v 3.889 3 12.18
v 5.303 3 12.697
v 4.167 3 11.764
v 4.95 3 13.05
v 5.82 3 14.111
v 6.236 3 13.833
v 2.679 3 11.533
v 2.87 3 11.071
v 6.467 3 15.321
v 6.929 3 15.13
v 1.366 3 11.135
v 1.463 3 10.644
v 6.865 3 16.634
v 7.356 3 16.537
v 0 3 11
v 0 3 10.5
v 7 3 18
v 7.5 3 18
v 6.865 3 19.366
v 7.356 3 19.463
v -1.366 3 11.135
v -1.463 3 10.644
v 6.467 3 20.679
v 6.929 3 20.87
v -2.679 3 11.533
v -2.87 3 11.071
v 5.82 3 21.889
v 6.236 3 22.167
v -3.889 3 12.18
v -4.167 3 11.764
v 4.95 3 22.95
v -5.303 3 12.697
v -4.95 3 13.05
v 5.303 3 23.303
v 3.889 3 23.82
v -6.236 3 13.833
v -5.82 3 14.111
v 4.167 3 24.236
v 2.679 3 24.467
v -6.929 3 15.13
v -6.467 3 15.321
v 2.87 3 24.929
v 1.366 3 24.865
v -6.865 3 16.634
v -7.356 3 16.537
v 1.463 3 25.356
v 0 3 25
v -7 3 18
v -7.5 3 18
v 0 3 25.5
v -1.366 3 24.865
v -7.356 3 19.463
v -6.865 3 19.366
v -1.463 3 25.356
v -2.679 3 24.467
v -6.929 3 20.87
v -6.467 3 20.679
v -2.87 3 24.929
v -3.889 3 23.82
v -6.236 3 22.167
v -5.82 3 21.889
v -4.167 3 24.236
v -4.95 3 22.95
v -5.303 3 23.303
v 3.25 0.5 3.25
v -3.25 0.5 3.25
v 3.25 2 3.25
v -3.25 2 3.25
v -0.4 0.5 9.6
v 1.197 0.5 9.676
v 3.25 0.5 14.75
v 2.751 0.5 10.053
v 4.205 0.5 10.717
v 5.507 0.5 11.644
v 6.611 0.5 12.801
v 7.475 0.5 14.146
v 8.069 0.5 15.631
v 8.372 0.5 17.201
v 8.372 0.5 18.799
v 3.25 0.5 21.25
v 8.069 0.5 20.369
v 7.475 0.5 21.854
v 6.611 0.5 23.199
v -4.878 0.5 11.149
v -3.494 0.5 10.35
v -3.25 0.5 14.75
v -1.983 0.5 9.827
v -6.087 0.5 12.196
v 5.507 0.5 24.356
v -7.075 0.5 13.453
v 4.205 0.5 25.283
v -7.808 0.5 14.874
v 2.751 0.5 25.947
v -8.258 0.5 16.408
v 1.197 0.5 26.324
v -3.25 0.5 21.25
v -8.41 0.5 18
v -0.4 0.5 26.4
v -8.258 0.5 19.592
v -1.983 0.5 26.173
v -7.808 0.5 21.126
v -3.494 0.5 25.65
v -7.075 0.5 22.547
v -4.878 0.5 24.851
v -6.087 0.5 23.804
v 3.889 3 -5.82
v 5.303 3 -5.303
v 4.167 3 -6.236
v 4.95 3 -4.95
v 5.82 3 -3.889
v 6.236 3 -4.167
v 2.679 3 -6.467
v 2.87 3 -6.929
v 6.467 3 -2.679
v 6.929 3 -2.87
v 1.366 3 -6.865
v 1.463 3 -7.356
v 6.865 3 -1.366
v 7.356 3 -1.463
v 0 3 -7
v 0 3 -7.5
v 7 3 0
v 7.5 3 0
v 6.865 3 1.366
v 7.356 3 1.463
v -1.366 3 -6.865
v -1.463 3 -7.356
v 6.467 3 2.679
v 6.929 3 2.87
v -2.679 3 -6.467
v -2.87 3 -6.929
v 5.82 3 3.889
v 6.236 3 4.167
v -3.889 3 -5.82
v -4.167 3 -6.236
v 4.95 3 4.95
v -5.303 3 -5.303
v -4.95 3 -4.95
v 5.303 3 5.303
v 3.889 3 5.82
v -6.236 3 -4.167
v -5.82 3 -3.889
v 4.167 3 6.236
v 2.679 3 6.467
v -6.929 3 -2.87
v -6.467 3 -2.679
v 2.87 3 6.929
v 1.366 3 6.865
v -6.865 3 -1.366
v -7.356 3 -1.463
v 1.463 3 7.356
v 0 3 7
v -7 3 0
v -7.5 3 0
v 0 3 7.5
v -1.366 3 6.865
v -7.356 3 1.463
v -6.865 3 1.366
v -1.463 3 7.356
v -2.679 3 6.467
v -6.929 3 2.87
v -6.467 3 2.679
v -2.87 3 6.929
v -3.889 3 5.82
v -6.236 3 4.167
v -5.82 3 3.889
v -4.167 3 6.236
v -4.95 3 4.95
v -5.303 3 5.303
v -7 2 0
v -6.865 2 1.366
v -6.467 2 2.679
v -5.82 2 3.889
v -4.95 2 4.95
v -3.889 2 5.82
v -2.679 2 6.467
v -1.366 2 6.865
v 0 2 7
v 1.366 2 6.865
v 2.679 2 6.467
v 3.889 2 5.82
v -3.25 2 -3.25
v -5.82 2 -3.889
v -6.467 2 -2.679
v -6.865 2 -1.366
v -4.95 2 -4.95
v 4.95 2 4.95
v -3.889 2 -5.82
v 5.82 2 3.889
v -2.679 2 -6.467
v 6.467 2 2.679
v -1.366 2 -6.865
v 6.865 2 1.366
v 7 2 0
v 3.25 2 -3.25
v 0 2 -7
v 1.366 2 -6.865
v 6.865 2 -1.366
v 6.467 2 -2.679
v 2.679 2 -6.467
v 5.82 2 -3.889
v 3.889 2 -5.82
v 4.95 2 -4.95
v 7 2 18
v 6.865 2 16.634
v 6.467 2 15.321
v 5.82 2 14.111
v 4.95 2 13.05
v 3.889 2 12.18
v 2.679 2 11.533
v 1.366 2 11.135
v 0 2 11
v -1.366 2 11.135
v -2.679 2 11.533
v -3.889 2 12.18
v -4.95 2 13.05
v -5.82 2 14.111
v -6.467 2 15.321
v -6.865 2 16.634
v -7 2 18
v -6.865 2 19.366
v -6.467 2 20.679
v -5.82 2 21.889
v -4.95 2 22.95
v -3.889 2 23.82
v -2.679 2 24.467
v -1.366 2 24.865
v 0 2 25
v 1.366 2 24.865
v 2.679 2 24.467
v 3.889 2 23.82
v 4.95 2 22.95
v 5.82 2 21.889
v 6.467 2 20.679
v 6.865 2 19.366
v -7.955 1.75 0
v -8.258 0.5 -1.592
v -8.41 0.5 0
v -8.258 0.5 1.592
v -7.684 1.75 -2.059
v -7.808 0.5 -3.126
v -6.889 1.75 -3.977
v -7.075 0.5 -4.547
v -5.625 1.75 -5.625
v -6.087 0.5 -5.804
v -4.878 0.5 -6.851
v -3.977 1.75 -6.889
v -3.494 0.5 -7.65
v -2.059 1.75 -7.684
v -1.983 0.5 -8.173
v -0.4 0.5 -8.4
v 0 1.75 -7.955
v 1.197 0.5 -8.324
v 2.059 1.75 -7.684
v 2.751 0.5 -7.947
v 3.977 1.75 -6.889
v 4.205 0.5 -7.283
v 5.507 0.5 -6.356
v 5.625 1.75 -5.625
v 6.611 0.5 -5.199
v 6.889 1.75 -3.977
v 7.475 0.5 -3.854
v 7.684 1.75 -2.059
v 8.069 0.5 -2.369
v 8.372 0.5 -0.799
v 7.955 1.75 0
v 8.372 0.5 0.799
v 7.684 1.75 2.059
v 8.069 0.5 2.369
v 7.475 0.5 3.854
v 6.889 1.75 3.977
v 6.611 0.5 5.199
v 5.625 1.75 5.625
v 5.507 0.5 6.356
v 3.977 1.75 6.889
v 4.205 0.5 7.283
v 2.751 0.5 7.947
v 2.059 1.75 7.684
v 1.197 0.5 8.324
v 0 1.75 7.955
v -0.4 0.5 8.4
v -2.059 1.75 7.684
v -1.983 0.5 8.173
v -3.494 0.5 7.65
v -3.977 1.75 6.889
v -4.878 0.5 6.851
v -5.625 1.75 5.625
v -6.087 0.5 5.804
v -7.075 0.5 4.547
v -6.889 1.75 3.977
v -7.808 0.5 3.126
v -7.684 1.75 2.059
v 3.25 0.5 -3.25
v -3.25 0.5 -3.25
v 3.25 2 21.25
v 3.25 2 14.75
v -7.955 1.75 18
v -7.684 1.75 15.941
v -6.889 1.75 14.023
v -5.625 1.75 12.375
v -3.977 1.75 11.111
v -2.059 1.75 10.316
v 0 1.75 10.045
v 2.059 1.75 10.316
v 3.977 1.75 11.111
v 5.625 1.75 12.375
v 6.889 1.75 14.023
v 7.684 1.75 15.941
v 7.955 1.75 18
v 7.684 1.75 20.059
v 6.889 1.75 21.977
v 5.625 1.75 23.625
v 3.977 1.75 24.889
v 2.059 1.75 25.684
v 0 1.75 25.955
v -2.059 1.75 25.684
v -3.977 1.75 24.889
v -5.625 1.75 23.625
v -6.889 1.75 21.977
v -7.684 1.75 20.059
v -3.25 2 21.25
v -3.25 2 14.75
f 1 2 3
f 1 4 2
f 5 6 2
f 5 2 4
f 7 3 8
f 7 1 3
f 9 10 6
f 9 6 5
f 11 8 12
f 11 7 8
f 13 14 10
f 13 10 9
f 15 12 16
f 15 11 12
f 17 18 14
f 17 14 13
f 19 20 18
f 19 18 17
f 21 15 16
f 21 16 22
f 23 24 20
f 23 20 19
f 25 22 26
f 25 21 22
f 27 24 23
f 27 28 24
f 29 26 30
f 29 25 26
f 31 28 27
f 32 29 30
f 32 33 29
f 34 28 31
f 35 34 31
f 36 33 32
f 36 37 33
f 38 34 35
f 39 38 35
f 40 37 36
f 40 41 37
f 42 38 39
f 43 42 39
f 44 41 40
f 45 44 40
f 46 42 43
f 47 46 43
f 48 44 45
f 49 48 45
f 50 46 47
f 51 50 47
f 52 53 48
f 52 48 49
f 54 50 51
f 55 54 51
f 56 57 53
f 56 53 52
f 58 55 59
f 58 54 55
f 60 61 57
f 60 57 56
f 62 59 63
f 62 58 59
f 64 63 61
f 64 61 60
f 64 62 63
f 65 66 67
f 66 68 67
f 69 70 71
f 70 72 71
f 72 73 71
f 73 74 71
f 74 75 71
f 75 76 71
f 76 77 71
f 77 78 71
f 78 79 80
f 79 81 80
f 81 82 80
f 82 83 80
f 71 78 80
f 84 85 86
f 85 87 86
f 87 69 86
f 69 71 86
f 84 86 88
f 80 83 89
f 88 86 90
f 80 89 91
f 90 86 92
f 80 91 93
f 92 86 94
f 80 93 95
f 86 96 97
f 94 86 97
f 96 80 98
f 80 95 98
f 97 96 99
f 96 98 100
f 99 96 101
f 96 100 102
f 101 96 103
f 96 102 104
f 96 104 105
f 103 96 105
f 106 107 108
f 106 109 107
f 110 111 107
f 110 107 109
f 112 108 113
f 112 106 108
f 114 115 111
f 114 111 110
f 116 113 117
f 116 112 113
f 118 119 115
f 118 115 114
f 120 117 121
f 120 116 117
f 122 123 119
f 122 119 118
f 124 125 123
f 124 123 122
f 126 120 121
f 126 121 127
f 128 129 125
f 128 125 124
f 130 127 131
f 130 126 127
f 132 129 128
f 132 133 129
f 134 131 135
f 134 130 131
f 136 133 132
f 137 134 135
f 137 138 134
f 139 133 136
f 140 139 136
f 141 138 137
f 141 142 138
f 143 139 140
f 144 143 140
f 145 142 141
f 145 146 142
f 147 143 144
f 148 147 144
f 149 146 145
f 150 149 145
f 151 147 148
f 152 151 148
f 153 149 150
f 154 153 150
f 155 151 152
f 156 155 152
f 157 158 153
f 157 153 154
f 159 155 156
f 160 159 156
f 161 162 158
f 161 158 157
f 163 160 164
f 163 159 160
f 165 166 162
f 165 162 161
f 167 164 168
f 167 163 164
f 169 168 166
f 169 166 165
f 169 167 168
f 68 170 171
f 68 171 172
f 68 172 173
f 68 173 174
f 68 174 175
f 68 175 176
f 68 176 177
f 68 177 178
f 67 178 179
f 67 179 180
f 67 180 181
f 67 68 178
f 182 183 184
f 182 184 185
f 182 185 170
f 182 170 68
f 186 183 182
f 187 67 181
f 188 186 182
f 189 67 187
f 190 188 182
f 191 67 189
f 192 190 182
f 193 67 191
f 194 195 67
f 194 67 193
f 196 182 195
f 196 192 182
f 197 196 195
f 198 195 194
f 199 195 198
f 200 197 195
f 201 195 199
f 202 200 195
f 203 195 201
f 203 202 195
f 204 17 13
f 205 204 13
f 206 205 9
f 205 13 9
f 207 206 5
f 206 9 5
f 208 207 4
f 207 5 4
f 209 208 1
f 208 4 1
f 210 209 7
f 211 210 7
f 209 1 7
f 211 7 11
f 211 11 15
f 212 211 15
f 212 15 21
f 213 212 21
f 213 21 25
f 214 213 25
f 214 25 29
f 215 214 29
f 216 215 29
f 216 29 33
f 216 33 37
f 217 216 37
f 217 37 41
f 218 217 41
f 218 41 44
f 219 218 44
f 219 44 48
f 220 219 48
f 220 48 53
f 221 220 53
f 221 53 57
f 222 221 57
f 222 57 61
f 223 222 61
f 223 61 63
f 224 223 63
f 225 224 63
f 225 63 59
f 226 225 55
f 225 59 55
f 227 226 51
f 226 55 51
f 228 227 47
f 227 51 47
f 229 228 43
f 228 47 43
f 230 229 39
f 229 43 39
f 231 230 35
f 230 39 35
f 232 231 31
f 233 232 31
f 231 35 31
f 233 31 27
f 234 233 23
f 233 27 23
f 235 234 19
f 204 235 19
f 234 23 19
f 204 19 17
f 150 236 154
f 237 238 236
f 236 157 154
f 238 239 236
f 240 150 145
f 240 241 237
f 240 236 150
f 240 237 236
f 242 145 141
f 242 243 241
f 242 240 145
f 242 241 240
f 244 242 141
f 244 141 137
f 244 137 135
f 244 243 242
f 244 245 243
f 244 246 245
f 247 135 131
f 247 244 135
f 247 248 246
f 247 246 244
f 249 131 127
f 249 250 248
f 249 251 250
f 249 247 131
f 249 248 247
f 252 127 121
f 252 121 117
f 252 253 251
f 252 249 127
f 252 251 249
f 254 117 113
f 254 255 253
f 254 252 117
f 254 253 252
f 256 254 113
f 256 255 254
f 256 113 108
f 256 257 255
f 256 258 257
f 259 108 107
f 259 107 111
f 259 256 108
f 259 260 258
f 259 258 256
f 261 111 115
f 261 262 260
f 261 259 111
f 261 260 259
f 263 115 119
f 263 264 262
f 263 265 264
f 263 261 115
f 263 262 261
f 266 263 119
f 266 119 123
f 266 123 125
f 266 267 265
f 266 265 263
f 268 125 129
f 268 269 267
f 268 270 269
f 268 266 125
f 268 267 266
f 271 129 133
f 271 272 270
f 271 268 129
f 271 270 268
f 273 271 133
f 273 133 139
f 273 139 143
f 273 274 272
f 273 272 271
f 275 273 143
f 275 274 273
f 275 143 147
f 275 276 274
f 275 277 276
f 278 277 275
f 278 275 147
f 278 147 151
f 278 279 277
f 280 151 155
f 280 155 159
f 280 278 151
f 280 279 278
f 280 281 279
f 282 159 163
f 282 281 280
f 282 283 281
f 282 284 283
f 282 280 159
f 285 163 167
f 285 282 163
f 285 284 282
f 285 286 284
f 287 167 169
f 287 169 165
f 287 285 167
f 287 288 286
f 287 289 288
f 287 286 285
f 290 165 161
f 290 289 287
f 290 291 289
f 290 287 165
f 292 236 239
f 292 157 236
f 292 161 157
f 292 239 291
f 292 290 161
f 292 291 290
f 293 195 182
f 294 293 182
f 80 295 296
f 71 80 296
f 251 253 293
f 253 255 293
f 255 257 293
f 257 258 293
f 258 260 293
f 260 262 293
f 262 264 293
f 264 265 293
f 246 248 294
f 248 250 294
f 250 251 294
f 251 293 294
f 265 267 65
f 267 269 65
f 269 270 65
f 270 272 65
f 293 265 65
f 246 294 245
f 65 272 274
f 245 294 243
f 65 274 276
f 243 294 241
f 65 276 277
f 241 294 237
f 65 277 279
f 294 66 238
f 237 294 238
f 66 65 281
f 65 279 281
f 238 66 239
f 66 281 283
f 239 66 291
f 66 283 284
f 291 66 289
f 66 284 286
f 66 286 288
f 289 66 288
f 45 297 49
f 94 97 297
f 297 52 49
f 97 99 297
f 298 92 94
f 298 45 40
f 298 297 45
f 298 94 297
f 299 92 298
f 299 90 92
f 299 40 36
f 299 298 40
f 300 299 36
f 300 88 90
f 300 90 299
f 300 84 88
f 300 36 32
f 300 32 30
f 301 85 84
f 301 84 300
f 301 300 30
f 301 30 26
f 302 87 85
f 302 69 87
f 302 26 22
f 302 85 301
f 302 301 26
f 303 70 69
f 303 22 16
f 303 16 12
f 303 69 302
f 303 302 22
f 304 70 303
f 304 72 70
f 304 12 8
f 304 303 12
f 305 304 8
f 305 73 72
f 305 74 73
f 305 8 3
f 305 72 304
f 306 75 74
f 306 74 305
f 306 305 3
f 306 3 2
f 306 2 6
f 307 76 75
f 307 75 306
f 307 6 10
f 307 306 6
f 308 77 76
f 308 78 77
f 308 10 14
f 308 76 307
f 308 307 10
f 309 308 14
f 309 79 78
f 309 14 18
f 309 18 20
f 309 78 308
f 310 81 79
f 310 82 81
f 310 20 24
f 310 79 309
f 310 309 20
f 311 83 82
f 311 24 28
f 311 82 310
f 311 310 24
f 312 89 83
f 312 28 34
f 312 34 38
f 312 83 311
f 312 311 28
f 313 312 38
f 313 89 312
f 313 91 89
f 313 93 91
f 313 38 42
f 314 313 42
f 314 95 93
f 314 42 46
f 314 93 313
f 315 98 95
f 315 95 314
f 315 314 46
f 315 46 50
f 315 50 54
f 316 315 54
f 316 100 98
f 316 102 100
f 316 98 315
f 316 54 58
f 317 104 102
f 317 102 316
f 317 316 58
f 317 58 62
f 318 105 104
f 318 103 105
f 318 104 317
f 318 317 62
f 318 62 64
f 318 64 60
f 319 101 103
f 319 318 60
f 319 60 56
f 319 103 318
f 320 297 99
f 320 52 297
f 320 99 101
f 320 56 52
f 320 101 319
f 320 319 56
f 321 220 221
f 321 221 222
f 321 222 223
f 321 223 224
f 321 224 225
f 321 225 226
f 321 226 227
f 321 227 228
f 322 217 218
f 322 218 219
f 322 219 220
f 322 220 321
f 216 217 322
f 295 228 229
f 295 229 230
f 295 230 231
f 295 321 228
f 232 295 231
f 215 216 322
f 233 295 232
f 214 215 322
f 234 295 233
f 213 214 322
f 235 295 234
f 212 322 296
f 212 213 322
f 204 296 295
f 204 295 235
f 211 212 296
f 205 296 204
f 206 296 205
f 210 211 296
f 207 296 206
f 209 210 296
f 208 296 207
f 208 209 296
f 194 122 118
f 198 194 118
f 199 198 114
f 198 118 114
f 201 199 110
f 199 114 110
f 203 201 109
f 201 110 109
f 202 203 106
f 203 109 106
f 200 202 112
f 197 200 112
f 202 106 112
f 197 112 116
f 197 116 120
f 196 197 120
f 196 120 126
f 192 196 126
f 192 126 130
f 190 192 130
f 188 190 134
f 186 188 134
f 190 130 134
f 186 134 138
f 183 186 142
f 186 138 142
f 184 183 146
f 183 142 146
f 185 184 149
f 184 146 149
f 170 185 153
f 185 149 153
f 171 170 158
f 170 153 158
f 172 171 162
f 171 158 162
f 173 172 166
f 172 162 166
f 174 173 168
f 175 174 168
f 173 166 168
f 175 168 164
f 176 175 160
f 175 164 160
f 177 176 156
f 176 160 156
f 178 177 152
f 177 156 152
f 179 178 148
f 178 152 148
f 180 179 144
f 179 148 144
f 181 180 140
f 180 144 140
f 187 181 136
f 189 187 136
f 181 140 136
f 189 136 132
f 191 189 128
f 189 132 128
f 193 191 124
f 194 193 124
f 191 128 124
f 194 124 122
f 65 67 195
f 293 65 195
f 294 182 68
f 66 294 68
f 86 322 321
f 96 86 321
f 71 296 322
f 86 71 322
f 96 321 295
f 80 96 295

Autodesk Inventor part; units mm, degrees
ref_plane "YZ Plane" through (0, 0, 0) normal (1, 0, 0) x (0, 1, 0)
ref_plane "XZ Plane" through (0, 0, 0) normal (0, 1, 0) x (-1, 0, 0)
ref_plane "XY Plane" through (0, 0, 0) normal (0, 0, 1) x (1, 0, 0)
sketch "Sketch1" plane through (0, 0, 0) normal (0, 1, 0) x (-1, 0, 0)
  circle A0 centre (0, 0) radius 7
  circle A1 centre (0, 0) radius 7.5
  dimension "d0" = 14
  dimension "d1" = 15
extrude "Extrusion1" add sketch "Sketch1" along normal blind 3 contours A0 | A1
sketch "Sketch2" plane through (0, 3, 0) normal (0, 1, 0) x (1, 0, 0)
  line L0 (3.25, 3.25) -> (-3.25, 3.25)
  line L1 (-3.25, 3.25) -> (-3.25, -3.25)
  line L2 (-3.25, -3.25) -> (3.25, -3.25)
  line L3 (3.25, -3.25) -> (3.25, 3.25)
  line L4 (3.25, 3.25) -> (-3.25, -3.25) construction
  line L5 (-3.25, 3.25) -> (3.25, -3.25) construction
  point P0 (0, 0)
  dimension "d4" = 6.5
  dimension "d5" = 6.5
extrude "Extrusion2" cut sketch "Sketch2" against normal through all
sketch "Sketch3" plane through (0, 3, 0) normal (0, 1, 0) x (1, 0, 0)
  circle A0 centre (0, 0) radius 7
  dimension "d8" = 14
extrude "Extrusion3" cut sketch "Sketch3" against normal blind 1
thicken "Thicken1" operation add thickness 0.5 both sides no extend neighbours yes toward (0, 1, 0) faces at (-4.6667, 0, 0)
draft "FaceDraft1" angle 20 pull direction (0, 1, 0) faces at (-7.4757, 1.3333, 0.6035) fixed edges at (7.5, 3, 0)
pattern_linear "Rectangular Pattern1" count 2 spacing 18 along (0, 0, 1)
properties part number "spool_holder_washer"
